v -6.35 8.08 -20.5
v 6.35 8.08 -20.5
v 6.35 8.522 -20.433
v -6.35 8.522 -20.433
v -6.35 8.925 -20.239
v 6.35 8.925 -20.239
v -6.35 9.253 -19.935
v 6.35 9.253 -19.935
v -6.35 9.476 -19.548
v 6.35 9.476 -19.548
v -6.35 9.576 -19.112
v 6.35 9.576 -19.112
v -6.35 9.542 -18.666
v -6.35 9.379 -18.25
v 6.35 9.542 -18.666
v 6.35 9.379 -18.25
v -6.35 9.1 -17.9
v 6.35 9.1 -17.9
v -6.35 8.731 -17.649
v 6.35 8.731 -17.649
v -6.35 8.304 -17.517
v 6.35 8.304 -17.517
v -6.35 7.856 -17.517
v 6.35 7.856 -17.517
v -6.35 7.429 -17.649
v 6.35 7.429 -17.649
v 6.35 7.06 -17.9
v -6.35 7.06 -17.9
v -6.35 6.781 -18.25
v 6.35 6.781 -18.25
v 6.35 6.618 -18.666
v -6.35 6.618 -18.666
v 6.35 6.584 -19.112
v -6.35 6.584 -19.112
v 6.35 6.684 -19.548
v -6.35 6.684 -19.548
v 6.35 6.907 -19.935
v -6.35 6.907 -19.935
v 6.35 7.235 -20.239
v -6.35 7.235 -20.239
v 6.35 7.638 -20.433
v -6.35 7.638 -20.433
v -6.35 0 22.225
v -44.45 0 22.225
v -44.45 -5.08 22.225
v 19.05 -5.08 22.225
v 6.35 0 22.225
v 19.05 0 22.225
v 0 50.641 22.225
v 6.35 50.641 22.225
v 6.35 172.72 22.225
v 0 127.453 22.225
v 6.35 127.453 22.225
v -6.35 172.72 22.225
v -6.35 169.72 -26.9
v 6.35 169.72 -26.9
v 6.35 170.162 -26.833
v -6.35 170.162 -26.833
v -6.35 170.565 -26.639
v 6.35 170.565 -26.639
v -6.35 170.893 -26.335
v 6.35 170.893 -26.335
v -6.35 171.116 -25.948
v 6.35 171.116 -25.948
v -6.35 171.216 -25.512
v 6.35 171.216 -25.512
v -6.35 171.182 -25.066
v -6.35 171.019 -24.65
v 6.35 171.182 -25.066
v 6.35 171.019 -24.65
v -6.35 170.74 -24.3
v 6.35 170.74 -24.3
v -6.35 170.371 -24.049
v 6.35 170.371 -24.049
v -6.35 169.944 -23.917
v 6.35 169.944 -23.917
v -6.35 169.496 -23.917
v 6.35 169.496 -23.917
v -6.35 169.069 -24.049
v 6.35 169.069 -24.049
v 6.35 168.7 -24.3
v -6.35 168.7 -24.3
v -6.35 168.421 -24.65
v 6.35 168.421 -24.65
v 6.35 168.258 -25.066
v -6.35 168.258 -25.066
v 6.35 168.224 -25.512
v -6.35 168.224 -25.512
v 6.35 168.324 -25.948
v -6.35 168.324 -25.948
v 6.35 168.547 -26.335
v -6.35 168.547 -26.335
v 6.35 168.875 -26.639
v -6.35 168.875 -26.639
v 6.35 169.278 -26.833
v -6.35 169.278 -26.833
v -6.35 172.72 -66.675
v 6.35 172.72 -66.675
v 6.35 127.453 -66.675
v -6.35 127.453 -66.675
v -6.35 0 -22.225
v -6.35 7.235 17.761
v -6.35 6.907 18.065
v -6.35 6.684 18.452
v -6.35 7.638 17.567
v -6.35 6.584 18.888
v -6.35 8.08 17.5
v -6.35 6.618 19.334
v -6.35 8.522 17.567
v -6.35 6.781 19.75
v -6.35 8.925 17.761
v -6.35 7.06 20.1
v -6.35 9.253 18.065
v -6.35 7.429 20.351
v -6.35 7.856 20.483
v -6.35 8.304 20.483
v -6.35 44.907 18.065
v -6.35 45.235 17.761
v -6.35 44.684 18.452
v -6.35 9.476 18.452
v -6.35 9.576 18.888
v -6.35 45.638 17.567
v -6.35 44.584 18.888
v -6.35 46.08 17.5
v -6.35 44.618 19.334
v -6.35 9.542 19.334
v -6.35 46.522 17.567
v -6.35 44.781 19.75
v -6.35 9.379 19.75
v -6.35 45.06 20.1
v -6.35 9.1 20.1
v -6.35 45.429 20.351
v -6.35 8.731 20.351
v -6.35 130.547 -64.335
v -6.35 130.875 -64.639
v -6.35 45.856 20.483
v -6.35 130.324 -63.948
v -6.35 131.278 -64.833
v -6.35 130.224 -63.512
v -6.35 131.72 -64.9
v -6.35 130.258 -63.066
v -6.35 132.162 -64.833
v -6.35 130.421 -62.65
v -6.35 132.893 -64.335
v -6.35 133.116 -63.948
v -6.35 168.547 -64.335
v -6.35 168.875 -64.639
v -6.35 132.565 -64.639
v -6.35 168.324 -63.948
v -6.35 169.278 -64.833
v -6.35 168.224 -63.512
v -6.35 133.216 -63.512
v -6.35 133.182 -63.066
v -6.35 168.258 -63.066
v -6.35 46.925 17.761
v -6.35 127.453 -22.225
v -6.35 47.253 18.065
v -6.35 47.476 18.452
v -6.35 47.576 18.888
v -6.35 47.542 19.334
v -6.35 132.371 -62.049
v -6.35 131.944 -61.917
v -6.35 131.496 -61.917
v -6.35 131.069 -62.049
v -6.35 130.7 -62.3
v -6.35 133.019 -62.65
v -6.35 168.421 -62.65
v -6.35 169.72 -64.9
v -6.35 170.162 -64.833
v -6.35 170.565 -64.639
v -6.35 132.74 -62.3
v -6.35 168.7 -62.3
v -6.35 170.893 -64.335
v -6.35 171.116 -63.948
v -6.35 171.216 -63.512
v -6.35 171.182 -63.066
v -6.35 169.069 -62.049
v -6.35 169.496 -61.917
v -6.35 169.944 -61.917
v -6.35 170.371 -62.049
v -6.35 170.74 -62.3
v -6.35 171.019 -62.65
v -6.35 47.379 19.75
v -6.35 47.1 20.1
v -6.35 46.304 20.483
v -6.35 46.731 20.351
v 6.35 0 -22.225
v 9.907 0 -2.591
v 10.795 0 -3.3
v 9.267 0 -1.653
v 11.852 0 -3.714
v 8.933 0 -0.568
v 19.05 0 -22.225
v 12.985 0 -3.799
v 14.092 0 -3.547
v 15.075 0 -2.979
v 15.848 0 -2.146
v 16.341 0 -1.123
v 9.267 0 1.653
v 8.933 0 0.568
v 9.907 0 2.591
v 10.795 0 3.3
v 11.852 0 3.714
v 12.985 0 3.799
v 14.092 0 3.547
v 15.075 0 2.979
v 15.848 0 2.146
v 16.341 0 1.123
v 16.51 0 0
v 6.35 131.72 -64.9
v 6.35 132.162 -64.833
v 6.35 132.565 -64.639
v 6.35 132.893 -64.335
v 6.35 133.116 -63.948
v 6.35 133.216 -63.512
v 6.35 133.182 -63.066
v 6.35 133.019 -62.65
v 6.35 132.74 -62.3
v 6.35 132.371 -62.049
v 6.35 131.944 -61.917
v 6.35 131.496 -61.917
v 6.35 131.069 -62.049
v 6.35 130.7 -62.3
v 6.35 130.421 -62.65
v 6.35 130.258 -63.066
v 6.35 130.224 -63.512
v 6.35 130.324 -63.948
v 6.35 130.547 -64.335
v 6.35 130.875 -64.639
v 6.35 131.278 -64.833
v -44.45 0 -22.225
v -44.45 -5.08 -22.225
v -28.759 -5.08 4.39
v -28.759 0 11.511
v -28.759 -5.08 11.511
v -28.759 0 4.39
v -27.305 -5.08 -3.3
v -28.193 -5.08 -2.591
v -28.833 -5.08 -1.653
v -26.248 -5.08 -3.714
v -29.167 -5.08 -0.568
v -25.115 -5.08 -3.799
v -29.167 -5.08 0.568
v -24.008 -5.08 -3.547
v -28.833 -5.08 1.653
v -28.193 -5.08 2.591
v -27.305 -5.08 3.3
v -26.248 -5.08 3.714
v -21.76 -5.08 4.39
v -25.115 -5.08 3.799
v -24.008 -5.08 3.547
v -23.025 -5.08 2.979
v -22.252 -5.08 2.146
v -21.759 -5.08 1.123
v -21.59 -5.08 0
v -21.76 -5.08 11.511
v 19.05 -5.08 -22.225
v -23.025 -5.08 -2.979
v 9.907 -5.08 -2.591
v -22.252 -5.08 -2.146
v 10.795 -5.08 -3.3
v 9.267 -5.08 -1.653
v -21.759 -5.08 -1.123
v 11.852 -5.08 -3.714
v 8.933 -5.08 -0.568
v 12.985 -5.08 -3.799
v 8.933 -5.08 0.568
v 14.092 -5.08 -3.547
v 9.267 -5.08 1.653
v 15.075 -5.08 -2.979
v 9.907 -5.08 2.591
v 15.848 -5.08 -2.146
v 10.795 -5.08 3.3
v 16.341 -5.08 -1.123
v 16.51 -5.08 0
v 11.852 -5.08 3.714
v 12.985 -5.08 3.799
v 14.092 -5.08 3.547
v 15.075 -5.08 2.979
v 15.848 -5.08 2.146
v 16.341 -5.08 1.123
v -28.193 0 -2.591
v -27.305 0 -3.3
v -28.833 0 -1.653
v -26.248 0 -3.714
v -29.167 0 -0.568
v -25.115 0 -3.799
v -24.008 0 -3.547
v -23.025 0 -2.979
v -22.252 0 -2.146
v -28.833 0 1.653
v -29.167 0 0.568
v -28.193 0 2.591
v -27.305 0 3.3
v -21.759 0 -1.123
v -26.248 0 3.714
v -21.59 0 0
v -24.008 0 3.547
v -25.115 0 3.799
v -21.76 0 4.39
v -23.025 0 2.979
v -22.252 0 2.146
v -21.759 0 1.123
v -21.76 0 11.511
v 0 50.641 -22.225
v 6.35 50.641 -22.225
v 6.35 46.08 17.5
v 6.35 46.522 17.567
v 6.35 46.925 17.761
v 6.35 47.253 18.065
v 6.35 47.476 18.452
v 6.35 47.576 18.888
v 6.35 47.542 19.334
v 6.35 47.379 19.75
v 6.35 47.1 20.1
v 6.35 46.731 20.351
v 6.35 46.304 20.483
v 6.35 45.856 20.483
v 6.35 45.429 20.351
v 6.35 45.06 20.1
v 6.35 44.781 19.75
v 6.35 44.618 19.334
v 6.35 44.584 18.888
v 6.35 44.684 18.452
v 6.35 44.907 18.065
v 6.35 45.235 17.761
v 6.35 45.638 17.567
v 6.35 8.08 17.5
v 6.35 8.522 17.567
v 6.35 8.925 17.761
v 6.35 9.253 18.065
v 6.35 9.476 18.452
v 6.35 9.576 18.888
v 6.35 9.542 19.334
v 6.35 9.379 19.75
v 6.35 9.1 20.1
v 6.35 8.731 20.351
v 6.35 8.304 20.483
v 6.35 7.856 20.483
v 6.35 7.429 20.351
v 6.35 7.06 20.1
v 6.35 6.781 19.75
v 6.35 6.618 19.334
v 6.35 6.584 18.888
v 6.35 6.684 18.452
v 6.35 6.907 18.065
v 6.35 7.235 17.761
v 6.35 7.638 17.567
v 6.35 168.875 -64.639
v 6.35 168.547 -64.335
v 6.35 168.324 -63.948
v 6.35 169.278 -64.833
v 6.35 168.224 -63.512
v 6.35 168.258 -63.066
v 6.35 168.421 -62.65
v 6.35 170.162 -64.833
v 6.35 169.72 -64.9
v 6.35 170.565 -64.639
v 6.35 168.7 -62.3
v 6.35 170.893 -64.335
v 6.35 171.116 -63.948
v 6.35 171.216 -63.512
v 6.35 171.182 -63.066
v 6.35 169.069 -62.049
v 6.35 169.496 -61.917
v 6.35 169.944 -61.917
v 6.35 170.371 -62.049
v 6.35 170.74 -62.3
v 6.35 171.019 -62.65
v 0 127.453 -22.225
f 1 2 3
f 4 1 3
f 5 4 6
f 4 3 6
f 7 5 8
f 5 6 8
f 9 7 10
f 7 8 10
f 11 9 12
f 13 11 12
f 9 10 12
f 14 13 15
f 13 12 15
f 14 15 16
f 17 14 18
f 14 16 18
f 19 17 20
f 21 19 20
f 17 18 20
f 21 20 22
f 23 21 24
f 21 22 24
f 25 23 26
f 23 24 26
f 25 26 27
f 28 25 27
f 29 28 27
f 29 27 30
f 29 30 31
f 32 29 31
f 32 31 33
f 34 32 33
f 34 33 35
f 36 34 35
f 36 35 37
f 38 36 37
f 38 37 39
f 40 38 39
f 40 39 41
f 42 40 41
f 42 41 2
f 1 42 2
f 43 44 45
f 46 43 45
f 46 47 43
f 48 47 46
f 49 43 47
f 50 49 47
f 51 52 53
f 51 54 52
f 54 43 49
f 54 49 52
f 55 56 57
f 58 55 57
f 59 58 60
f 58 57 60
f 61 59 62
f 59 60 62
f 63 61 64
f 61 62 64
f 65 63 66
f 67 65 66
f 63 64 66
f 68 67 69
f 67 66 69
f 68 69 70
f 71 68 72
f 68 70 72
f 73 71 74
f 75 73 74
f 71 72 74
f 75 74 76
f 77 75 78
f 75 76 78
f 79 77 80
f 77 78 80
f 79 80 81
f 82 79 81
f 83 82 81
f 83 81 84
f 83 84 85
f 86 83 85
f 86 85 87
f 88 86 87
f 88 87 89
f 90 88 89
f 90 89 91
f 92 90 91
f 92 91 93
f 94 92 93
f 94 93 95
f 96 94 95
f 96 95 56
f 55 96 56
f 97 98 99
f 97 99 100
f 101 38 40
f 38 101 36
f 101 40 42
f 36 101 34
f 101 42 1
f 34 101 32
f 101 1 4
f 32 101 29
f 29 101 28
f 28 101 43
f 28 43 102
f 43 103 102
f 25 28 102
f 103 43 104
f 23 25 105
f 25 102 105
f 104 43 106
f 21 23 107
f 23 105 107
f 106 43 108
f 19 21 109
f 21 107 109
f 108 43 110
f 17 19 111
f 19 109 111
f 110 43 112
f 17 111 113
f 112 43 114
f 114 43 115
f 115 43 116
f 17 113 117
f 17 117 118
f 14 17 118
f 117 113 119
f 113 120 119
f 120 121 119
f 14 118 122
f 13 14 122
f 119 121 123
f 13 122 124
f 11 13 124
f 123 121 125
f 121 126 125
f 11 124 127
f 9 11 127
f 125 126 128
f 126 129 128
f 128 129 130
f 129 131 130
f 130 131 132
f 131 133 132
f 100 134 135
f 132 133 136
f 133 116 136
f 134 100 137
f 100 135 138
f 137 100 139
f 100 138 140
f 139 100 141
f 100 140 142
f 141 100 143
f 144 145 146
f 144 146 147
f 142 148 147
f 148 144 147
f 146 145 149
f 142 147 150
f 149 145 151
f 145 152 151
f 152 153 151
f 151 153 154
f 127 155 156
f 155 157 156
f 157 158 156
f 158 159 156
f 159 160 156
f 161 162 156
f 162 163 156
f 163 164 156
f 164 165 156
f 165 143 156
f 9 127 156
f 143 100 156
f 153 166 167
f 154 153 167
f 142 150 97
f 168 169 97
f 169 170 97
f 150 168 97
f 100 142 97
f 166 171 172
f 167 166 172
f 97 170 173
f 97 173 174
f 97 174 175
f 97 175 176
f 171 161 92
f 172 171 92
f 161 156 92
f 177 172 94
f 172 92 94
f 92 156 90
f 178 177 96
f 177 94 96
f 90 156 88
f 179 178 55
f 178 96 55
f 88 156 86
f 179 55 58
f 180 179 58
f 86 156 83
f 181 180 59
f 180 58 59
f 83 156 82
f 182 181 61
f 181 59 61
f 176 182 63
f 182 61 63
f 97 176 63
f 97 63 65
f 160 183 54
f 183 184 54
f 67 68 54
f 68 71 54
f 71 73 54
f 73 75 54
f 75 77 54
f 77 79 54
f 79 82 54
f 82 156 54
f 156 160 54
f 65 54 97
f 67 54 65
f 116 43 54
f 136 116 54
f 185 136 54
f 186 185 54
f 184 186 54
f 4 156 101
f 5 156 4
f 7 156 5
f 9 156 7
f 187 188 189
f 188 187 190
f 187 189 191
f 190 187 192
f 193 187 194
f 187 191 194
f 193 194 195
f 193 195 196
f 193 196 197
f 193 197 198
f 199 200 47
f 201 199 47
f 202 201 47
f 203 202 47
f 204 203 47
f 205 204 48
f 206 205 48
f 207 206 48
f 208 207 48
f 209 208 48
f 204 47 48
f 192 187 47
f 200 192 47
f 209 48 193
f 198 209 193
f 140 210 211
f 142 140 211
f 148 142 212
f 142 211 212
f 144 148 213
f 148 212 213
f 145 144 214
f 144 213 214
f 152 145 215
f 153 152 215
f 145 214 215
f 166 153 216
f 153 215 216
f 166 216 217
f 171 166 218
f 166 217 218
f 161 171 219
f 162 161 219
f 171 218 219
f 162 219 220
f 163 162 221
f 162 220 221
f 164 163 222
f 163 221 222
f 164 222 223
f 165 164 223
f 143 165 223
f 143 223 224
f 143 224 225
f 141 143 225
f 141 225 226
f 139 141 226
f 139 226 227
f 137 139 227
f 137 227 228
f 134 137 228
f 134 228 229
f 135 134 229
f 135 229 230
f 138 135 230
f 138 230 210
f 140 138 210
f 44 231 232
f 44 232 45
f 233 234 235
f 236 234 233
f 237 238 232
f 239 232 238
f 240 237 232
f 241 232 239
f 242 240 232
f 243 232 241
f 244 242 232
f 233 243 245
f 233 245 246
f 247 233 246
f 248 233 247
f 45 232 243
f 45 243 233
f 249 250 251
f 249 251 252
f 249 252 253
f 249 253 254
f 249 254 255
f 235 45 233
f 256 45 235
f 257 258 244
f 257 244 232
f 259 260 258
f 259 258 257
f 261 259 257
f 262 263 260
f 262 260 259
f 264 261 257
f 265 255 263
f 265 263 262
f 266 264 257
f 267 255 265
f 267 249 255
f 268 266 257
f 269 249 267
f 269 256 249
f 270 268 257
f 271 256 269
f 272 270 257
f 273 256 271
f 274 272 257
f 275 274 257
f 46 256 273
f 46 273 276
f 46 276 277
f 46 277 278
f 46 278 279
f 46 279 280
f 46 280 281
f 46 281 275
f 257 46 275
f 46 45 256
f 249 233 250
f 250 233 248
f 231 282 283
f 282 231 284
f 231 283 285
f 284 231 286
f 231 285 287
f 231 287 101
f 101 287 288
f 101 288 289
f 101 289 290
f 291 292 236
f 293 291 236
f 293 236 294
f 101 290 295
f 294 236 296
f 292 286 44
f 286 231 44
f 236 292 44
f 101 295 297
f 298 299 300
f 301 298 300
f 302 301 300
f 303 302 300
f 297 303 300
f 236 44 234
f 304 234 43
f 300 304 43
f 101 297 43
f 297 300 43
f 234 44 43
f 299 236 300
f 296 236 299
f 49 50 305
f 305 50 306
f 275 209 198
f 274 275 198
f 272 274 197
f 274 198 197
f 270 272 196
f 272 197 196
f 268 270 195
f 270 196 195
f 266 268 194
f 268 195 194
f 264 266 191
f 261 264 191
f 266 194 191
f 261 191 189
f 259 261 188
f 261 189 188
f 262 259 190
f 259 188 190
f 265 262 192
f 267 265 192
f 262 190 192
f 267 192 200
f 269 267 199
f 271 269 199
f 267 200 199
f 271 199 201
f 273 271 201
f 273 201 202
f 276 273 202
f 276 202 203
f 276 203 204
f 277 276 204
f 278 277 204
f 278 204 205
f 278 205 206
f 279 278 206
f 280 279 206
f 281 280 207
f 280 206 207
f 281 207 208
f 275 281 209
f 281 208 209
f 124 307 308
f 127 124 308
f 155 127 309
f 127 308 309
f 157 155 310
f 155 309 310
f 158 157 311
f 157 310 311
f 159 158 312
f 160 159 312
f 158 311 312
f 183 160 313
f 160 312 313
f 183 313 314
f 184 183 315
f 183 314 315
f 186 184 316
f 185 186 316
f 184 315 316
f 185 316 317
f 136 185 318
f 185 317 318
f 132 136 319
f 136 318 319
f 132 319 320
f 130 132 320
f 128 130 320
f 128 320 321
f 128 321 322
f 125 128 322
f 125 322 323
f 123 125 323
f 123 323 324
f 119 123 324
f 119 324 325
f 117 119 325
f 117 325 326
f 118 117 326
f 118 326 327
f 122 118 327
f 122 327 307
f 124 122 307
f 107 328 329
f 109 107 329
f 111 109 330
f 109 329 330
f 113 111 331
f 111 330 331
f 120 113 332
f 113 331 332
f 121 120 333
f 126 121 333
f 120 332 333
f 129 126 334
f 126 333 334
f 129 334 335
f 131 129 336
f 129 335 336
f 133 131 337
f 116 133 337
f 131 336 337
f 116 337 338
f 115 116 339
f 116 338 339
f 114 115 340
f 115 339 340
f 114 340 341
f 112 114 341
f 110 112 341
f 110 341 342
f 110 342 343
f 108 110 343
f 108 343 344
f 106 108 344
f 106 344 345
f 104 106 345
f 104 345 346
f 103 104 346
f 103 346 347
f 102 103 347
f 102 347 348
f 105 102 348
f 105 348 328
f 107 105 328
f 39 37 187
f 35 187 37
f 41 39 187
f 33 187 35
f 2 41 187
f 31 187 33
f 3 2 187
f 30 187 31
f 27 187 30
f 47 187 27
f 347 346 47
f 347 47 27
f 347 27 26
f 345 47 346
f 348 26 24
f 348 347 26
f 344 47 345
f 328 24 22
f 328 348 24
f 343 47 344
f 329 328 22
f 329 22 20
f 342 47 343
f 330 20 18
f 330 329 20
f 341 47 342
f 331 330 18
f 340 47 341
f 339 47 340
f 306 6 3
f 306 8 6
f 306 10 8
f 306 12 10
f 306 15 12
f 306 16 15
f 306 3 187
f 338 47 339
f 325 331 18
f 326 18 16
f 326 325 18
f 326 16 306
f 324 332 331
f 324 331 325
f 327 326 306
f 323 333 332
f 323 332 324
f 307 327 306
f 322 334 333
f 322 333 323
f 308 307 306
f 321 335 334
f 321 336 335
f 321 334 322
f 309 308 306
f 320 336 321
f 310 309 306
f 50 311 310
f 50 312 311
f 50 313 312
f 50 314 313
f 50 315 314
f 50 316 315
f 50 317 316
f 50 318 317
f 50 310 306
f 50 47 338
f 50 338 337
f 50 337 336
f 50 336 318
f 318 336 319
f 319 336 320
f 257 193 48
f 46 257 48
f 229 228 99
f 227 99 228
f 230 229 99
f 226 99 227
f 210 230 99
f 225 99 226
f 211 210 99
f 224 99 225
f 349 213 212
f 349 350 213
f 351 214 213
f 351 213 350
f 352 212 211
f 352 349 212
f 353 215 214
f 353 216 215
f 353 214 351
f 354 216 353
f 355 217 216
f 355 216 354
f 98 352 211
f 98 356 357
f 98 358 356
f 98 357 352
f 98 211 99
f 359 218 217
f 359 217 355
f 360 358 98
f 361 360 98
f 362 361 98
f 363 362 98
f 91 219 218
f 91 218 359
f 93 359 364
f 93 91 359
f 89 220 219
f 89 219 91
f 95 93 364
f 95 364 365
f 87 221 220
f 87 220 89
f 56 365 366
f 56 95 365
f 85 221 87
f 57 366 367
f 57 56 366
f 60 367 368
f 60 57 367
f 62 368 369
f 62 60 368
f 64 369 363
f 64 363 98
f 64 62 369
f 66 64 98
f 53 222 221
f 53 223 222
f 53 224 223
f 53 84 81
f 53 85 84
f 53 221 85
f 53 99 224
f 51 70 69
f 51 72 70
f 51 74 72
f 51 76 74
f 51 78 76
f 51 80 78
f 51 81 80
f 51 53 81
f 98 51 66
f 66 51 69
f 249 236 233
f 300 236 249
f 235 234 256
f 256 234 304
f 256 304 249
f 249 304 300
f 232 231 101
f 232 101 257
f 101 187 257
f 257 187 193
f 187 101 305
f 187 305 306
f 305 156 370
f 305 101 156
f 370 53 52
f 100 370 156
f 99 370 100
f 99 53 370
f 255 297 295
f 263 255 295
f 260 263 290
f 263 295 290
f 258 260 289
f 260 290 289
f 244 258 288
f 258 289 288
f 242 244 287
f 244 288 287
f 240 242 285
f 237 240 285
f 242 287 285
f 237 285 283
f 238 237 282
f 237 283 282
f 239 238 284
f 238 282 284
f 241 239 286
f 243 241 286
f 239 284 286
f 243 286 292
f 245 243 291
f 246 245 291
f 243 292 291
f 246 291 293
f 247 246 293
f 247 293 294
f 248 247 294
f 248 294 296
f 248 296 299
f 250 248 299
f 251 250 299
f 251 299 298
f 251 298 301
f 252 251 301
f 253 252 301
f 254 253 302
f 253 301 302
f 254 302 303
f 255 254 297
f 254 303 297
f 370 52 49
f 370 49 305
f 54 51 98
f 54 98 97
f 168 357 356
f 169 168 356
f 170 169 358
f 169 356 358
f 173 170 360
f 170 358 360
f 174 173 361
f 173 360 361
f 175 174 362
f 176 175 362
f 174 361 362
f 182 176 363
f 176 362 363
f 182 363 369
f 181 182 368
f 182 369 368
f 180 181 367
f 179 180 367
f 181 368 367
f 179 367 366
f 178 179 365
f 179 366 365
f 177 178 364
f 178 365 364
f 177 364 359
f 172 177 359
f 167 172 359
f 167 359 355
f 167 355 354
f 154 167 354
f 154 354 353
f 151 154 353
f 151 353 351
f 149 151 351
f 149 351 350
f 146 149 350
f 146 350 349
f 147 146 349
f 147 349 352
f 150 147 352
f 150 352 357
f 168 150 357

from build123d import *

# Parameters (mm, degrees)
SKETCH1_W                      = 12.7
SKETCH1_H                      = 44.45
HEIGHT_EXTRUDE_DEPTH           = 172.72
SKETCH2_R                      = 1.5
BOTTOM_FAN_MOUNT_CUTS_DEPTH    = 13.7
SKETCH3_W                      = 63.5
SKETCH3_H                      = 44.45
MOUNTING_BASE_EXTRUDE_DEPTH    = 5.08
SKETCH4_R                      = 3.81
MOUNTING_BOLT_HOLE_CUT_DEPTH   = 5.08
SKETCH6_W                      = 6.998886625
SKETCH6_H                      = 7.121323501
OPTIONAL_WIRE_ESCAPE_CUT_DEPTH = 5.08
SKETCH7_W                      = 12.7
SKETCH7_H                      = 45.266682412
BOSS_EXTRUDE1_DEPTH            = 44.45
SKETCH5_R                      = 1.5
TOP_FAN_MOUNT_CUTS_DEPTH       = 51.8
SKETCH8_W                      = 44.45
SKETCH8_H                      = 76.812549829
FILAMENT_NO_STICK_CUT_DEPTH    = 6.35


with BuildPart() as part:
    # Sketch1 → Height extrude (new body)
    with BuildSketch(Plane(origin=(0, 0, 0), x_dir=(1, 0, 0), z_dir=(0, 1, 0))):
        Rectangle(SKETCH1_W, SKETCH1_H)
    extrude(amount=HEIGHT_EXTRUDE_DEPTH)

    # Sketch2 → Bottom Fan Mount Cuts (cut, through all)
    with BuildSketch(Plane(origin=(6.35, 0, 0), x_dir=(0, 0, -1), z_dir=(1, 0, 0))):
        with Locations((-19.0000001, 8.079994)):
            Circle(SKETCH2_R)
        with Locations((19, 8.079994)):
            Circle(SKETCH2_R)
        with Locations((-19.0000001, 46.079994)):
            Circle(SKETCH2_R)
    extrude(amount=-BOTTOM_FAN_MOUNT_CUTS_DEPTH, mode=Mode.SUBTRACT)

    # Sketch3 → Mounting Base Extrude (add)
    with BuildSketch(Plane.XZ):
        with Locations((-12.7, 0)):
            Rectangle(SKETCH3_W, SKETCH3_H)
    extrude(amount=MOUNTING_BASE_EXTRUDE_DEPTH)

    # Sketch4 → Mounting Bolt Hole Cut (cut)
    with BuildSketch(Plane(origin=(0, 0, 0), x_dir=(1, 0, 0), z_dir=(0, 1, 0))):
        with Locations((12.7, 0)):
            Circle(SKETCH4_R)
        with Locations((-25.4, 0)):
            Circle(SKETCH4_R)
    extrude(amount=-MOUNTING_BOLT_HOLE_CUT_DEPTH, mode=Mode.SUBTRACT)

    # Sketch6 → Optional Wire Escape Cut (cut)
    with BuildSketch(Plane(origin=(0, 0, 0), x_dir=(1, 0, 0), z_dir=(0, 1, 0))):
        with Locations((-25.259836811, -7.950336846)):
            Rectangle(SKETCH6_W, SKETCH6_H)
    extrude(amount=-OPTIONAL_WIRE_ESCAPE_CUT_DEPTH, mode=Mode.SUBTRACT)

    # Sketch7 → Boss-Extrude1 (add)
    with BuildSketch(Plane(origin=(0, 0, -22.225), x_dir=(-1, 0, 0), z_dir=(0, 0, -1))):
        with Locations((0, 150.086658794)):
            Rectangle(SKETCH7_W, SKETCH7_H)
    extrude(amount=BOSS_EXTRUDE1_DEPTH)

    # Sketch5 → Top Fan Mount Cuts (cut, through all)
    with BuildSketch(Plane(origin=(6.35, 0, 0), x_dir=(0, 0, -1), z_dir=(1, 0, 0))):
        with Locations((25.4, 169.72)):
            Circle(SKETCH5_R)
        with Locations((63.4, 169.72)):
            Circle(SKETCH5_R)
        with Locations((63.4, 131.72)):
            Circle(SKETCH5_R)
    extrude(amount=-TOP_FAN_MOUNT_CUTS_DEPTH, mode=Mode.SUBTRACT)

    # Sketch8 → Filament no stick cut (cut)
    with BuildSketch(Plane(origin=(6.35, 0, 0), x_dir=(0, 0, -1), z_dir=(1, 0, 0))):
        with Locations((0, 89.047042674)):
            Rectangle(SKETCH8_W, SKETCH8_H)
    extrude(amount=-FILAMENT_NO_STICK_CUT_DEPTH, mode=Mode.SUBTRACT)


solid = part.part
